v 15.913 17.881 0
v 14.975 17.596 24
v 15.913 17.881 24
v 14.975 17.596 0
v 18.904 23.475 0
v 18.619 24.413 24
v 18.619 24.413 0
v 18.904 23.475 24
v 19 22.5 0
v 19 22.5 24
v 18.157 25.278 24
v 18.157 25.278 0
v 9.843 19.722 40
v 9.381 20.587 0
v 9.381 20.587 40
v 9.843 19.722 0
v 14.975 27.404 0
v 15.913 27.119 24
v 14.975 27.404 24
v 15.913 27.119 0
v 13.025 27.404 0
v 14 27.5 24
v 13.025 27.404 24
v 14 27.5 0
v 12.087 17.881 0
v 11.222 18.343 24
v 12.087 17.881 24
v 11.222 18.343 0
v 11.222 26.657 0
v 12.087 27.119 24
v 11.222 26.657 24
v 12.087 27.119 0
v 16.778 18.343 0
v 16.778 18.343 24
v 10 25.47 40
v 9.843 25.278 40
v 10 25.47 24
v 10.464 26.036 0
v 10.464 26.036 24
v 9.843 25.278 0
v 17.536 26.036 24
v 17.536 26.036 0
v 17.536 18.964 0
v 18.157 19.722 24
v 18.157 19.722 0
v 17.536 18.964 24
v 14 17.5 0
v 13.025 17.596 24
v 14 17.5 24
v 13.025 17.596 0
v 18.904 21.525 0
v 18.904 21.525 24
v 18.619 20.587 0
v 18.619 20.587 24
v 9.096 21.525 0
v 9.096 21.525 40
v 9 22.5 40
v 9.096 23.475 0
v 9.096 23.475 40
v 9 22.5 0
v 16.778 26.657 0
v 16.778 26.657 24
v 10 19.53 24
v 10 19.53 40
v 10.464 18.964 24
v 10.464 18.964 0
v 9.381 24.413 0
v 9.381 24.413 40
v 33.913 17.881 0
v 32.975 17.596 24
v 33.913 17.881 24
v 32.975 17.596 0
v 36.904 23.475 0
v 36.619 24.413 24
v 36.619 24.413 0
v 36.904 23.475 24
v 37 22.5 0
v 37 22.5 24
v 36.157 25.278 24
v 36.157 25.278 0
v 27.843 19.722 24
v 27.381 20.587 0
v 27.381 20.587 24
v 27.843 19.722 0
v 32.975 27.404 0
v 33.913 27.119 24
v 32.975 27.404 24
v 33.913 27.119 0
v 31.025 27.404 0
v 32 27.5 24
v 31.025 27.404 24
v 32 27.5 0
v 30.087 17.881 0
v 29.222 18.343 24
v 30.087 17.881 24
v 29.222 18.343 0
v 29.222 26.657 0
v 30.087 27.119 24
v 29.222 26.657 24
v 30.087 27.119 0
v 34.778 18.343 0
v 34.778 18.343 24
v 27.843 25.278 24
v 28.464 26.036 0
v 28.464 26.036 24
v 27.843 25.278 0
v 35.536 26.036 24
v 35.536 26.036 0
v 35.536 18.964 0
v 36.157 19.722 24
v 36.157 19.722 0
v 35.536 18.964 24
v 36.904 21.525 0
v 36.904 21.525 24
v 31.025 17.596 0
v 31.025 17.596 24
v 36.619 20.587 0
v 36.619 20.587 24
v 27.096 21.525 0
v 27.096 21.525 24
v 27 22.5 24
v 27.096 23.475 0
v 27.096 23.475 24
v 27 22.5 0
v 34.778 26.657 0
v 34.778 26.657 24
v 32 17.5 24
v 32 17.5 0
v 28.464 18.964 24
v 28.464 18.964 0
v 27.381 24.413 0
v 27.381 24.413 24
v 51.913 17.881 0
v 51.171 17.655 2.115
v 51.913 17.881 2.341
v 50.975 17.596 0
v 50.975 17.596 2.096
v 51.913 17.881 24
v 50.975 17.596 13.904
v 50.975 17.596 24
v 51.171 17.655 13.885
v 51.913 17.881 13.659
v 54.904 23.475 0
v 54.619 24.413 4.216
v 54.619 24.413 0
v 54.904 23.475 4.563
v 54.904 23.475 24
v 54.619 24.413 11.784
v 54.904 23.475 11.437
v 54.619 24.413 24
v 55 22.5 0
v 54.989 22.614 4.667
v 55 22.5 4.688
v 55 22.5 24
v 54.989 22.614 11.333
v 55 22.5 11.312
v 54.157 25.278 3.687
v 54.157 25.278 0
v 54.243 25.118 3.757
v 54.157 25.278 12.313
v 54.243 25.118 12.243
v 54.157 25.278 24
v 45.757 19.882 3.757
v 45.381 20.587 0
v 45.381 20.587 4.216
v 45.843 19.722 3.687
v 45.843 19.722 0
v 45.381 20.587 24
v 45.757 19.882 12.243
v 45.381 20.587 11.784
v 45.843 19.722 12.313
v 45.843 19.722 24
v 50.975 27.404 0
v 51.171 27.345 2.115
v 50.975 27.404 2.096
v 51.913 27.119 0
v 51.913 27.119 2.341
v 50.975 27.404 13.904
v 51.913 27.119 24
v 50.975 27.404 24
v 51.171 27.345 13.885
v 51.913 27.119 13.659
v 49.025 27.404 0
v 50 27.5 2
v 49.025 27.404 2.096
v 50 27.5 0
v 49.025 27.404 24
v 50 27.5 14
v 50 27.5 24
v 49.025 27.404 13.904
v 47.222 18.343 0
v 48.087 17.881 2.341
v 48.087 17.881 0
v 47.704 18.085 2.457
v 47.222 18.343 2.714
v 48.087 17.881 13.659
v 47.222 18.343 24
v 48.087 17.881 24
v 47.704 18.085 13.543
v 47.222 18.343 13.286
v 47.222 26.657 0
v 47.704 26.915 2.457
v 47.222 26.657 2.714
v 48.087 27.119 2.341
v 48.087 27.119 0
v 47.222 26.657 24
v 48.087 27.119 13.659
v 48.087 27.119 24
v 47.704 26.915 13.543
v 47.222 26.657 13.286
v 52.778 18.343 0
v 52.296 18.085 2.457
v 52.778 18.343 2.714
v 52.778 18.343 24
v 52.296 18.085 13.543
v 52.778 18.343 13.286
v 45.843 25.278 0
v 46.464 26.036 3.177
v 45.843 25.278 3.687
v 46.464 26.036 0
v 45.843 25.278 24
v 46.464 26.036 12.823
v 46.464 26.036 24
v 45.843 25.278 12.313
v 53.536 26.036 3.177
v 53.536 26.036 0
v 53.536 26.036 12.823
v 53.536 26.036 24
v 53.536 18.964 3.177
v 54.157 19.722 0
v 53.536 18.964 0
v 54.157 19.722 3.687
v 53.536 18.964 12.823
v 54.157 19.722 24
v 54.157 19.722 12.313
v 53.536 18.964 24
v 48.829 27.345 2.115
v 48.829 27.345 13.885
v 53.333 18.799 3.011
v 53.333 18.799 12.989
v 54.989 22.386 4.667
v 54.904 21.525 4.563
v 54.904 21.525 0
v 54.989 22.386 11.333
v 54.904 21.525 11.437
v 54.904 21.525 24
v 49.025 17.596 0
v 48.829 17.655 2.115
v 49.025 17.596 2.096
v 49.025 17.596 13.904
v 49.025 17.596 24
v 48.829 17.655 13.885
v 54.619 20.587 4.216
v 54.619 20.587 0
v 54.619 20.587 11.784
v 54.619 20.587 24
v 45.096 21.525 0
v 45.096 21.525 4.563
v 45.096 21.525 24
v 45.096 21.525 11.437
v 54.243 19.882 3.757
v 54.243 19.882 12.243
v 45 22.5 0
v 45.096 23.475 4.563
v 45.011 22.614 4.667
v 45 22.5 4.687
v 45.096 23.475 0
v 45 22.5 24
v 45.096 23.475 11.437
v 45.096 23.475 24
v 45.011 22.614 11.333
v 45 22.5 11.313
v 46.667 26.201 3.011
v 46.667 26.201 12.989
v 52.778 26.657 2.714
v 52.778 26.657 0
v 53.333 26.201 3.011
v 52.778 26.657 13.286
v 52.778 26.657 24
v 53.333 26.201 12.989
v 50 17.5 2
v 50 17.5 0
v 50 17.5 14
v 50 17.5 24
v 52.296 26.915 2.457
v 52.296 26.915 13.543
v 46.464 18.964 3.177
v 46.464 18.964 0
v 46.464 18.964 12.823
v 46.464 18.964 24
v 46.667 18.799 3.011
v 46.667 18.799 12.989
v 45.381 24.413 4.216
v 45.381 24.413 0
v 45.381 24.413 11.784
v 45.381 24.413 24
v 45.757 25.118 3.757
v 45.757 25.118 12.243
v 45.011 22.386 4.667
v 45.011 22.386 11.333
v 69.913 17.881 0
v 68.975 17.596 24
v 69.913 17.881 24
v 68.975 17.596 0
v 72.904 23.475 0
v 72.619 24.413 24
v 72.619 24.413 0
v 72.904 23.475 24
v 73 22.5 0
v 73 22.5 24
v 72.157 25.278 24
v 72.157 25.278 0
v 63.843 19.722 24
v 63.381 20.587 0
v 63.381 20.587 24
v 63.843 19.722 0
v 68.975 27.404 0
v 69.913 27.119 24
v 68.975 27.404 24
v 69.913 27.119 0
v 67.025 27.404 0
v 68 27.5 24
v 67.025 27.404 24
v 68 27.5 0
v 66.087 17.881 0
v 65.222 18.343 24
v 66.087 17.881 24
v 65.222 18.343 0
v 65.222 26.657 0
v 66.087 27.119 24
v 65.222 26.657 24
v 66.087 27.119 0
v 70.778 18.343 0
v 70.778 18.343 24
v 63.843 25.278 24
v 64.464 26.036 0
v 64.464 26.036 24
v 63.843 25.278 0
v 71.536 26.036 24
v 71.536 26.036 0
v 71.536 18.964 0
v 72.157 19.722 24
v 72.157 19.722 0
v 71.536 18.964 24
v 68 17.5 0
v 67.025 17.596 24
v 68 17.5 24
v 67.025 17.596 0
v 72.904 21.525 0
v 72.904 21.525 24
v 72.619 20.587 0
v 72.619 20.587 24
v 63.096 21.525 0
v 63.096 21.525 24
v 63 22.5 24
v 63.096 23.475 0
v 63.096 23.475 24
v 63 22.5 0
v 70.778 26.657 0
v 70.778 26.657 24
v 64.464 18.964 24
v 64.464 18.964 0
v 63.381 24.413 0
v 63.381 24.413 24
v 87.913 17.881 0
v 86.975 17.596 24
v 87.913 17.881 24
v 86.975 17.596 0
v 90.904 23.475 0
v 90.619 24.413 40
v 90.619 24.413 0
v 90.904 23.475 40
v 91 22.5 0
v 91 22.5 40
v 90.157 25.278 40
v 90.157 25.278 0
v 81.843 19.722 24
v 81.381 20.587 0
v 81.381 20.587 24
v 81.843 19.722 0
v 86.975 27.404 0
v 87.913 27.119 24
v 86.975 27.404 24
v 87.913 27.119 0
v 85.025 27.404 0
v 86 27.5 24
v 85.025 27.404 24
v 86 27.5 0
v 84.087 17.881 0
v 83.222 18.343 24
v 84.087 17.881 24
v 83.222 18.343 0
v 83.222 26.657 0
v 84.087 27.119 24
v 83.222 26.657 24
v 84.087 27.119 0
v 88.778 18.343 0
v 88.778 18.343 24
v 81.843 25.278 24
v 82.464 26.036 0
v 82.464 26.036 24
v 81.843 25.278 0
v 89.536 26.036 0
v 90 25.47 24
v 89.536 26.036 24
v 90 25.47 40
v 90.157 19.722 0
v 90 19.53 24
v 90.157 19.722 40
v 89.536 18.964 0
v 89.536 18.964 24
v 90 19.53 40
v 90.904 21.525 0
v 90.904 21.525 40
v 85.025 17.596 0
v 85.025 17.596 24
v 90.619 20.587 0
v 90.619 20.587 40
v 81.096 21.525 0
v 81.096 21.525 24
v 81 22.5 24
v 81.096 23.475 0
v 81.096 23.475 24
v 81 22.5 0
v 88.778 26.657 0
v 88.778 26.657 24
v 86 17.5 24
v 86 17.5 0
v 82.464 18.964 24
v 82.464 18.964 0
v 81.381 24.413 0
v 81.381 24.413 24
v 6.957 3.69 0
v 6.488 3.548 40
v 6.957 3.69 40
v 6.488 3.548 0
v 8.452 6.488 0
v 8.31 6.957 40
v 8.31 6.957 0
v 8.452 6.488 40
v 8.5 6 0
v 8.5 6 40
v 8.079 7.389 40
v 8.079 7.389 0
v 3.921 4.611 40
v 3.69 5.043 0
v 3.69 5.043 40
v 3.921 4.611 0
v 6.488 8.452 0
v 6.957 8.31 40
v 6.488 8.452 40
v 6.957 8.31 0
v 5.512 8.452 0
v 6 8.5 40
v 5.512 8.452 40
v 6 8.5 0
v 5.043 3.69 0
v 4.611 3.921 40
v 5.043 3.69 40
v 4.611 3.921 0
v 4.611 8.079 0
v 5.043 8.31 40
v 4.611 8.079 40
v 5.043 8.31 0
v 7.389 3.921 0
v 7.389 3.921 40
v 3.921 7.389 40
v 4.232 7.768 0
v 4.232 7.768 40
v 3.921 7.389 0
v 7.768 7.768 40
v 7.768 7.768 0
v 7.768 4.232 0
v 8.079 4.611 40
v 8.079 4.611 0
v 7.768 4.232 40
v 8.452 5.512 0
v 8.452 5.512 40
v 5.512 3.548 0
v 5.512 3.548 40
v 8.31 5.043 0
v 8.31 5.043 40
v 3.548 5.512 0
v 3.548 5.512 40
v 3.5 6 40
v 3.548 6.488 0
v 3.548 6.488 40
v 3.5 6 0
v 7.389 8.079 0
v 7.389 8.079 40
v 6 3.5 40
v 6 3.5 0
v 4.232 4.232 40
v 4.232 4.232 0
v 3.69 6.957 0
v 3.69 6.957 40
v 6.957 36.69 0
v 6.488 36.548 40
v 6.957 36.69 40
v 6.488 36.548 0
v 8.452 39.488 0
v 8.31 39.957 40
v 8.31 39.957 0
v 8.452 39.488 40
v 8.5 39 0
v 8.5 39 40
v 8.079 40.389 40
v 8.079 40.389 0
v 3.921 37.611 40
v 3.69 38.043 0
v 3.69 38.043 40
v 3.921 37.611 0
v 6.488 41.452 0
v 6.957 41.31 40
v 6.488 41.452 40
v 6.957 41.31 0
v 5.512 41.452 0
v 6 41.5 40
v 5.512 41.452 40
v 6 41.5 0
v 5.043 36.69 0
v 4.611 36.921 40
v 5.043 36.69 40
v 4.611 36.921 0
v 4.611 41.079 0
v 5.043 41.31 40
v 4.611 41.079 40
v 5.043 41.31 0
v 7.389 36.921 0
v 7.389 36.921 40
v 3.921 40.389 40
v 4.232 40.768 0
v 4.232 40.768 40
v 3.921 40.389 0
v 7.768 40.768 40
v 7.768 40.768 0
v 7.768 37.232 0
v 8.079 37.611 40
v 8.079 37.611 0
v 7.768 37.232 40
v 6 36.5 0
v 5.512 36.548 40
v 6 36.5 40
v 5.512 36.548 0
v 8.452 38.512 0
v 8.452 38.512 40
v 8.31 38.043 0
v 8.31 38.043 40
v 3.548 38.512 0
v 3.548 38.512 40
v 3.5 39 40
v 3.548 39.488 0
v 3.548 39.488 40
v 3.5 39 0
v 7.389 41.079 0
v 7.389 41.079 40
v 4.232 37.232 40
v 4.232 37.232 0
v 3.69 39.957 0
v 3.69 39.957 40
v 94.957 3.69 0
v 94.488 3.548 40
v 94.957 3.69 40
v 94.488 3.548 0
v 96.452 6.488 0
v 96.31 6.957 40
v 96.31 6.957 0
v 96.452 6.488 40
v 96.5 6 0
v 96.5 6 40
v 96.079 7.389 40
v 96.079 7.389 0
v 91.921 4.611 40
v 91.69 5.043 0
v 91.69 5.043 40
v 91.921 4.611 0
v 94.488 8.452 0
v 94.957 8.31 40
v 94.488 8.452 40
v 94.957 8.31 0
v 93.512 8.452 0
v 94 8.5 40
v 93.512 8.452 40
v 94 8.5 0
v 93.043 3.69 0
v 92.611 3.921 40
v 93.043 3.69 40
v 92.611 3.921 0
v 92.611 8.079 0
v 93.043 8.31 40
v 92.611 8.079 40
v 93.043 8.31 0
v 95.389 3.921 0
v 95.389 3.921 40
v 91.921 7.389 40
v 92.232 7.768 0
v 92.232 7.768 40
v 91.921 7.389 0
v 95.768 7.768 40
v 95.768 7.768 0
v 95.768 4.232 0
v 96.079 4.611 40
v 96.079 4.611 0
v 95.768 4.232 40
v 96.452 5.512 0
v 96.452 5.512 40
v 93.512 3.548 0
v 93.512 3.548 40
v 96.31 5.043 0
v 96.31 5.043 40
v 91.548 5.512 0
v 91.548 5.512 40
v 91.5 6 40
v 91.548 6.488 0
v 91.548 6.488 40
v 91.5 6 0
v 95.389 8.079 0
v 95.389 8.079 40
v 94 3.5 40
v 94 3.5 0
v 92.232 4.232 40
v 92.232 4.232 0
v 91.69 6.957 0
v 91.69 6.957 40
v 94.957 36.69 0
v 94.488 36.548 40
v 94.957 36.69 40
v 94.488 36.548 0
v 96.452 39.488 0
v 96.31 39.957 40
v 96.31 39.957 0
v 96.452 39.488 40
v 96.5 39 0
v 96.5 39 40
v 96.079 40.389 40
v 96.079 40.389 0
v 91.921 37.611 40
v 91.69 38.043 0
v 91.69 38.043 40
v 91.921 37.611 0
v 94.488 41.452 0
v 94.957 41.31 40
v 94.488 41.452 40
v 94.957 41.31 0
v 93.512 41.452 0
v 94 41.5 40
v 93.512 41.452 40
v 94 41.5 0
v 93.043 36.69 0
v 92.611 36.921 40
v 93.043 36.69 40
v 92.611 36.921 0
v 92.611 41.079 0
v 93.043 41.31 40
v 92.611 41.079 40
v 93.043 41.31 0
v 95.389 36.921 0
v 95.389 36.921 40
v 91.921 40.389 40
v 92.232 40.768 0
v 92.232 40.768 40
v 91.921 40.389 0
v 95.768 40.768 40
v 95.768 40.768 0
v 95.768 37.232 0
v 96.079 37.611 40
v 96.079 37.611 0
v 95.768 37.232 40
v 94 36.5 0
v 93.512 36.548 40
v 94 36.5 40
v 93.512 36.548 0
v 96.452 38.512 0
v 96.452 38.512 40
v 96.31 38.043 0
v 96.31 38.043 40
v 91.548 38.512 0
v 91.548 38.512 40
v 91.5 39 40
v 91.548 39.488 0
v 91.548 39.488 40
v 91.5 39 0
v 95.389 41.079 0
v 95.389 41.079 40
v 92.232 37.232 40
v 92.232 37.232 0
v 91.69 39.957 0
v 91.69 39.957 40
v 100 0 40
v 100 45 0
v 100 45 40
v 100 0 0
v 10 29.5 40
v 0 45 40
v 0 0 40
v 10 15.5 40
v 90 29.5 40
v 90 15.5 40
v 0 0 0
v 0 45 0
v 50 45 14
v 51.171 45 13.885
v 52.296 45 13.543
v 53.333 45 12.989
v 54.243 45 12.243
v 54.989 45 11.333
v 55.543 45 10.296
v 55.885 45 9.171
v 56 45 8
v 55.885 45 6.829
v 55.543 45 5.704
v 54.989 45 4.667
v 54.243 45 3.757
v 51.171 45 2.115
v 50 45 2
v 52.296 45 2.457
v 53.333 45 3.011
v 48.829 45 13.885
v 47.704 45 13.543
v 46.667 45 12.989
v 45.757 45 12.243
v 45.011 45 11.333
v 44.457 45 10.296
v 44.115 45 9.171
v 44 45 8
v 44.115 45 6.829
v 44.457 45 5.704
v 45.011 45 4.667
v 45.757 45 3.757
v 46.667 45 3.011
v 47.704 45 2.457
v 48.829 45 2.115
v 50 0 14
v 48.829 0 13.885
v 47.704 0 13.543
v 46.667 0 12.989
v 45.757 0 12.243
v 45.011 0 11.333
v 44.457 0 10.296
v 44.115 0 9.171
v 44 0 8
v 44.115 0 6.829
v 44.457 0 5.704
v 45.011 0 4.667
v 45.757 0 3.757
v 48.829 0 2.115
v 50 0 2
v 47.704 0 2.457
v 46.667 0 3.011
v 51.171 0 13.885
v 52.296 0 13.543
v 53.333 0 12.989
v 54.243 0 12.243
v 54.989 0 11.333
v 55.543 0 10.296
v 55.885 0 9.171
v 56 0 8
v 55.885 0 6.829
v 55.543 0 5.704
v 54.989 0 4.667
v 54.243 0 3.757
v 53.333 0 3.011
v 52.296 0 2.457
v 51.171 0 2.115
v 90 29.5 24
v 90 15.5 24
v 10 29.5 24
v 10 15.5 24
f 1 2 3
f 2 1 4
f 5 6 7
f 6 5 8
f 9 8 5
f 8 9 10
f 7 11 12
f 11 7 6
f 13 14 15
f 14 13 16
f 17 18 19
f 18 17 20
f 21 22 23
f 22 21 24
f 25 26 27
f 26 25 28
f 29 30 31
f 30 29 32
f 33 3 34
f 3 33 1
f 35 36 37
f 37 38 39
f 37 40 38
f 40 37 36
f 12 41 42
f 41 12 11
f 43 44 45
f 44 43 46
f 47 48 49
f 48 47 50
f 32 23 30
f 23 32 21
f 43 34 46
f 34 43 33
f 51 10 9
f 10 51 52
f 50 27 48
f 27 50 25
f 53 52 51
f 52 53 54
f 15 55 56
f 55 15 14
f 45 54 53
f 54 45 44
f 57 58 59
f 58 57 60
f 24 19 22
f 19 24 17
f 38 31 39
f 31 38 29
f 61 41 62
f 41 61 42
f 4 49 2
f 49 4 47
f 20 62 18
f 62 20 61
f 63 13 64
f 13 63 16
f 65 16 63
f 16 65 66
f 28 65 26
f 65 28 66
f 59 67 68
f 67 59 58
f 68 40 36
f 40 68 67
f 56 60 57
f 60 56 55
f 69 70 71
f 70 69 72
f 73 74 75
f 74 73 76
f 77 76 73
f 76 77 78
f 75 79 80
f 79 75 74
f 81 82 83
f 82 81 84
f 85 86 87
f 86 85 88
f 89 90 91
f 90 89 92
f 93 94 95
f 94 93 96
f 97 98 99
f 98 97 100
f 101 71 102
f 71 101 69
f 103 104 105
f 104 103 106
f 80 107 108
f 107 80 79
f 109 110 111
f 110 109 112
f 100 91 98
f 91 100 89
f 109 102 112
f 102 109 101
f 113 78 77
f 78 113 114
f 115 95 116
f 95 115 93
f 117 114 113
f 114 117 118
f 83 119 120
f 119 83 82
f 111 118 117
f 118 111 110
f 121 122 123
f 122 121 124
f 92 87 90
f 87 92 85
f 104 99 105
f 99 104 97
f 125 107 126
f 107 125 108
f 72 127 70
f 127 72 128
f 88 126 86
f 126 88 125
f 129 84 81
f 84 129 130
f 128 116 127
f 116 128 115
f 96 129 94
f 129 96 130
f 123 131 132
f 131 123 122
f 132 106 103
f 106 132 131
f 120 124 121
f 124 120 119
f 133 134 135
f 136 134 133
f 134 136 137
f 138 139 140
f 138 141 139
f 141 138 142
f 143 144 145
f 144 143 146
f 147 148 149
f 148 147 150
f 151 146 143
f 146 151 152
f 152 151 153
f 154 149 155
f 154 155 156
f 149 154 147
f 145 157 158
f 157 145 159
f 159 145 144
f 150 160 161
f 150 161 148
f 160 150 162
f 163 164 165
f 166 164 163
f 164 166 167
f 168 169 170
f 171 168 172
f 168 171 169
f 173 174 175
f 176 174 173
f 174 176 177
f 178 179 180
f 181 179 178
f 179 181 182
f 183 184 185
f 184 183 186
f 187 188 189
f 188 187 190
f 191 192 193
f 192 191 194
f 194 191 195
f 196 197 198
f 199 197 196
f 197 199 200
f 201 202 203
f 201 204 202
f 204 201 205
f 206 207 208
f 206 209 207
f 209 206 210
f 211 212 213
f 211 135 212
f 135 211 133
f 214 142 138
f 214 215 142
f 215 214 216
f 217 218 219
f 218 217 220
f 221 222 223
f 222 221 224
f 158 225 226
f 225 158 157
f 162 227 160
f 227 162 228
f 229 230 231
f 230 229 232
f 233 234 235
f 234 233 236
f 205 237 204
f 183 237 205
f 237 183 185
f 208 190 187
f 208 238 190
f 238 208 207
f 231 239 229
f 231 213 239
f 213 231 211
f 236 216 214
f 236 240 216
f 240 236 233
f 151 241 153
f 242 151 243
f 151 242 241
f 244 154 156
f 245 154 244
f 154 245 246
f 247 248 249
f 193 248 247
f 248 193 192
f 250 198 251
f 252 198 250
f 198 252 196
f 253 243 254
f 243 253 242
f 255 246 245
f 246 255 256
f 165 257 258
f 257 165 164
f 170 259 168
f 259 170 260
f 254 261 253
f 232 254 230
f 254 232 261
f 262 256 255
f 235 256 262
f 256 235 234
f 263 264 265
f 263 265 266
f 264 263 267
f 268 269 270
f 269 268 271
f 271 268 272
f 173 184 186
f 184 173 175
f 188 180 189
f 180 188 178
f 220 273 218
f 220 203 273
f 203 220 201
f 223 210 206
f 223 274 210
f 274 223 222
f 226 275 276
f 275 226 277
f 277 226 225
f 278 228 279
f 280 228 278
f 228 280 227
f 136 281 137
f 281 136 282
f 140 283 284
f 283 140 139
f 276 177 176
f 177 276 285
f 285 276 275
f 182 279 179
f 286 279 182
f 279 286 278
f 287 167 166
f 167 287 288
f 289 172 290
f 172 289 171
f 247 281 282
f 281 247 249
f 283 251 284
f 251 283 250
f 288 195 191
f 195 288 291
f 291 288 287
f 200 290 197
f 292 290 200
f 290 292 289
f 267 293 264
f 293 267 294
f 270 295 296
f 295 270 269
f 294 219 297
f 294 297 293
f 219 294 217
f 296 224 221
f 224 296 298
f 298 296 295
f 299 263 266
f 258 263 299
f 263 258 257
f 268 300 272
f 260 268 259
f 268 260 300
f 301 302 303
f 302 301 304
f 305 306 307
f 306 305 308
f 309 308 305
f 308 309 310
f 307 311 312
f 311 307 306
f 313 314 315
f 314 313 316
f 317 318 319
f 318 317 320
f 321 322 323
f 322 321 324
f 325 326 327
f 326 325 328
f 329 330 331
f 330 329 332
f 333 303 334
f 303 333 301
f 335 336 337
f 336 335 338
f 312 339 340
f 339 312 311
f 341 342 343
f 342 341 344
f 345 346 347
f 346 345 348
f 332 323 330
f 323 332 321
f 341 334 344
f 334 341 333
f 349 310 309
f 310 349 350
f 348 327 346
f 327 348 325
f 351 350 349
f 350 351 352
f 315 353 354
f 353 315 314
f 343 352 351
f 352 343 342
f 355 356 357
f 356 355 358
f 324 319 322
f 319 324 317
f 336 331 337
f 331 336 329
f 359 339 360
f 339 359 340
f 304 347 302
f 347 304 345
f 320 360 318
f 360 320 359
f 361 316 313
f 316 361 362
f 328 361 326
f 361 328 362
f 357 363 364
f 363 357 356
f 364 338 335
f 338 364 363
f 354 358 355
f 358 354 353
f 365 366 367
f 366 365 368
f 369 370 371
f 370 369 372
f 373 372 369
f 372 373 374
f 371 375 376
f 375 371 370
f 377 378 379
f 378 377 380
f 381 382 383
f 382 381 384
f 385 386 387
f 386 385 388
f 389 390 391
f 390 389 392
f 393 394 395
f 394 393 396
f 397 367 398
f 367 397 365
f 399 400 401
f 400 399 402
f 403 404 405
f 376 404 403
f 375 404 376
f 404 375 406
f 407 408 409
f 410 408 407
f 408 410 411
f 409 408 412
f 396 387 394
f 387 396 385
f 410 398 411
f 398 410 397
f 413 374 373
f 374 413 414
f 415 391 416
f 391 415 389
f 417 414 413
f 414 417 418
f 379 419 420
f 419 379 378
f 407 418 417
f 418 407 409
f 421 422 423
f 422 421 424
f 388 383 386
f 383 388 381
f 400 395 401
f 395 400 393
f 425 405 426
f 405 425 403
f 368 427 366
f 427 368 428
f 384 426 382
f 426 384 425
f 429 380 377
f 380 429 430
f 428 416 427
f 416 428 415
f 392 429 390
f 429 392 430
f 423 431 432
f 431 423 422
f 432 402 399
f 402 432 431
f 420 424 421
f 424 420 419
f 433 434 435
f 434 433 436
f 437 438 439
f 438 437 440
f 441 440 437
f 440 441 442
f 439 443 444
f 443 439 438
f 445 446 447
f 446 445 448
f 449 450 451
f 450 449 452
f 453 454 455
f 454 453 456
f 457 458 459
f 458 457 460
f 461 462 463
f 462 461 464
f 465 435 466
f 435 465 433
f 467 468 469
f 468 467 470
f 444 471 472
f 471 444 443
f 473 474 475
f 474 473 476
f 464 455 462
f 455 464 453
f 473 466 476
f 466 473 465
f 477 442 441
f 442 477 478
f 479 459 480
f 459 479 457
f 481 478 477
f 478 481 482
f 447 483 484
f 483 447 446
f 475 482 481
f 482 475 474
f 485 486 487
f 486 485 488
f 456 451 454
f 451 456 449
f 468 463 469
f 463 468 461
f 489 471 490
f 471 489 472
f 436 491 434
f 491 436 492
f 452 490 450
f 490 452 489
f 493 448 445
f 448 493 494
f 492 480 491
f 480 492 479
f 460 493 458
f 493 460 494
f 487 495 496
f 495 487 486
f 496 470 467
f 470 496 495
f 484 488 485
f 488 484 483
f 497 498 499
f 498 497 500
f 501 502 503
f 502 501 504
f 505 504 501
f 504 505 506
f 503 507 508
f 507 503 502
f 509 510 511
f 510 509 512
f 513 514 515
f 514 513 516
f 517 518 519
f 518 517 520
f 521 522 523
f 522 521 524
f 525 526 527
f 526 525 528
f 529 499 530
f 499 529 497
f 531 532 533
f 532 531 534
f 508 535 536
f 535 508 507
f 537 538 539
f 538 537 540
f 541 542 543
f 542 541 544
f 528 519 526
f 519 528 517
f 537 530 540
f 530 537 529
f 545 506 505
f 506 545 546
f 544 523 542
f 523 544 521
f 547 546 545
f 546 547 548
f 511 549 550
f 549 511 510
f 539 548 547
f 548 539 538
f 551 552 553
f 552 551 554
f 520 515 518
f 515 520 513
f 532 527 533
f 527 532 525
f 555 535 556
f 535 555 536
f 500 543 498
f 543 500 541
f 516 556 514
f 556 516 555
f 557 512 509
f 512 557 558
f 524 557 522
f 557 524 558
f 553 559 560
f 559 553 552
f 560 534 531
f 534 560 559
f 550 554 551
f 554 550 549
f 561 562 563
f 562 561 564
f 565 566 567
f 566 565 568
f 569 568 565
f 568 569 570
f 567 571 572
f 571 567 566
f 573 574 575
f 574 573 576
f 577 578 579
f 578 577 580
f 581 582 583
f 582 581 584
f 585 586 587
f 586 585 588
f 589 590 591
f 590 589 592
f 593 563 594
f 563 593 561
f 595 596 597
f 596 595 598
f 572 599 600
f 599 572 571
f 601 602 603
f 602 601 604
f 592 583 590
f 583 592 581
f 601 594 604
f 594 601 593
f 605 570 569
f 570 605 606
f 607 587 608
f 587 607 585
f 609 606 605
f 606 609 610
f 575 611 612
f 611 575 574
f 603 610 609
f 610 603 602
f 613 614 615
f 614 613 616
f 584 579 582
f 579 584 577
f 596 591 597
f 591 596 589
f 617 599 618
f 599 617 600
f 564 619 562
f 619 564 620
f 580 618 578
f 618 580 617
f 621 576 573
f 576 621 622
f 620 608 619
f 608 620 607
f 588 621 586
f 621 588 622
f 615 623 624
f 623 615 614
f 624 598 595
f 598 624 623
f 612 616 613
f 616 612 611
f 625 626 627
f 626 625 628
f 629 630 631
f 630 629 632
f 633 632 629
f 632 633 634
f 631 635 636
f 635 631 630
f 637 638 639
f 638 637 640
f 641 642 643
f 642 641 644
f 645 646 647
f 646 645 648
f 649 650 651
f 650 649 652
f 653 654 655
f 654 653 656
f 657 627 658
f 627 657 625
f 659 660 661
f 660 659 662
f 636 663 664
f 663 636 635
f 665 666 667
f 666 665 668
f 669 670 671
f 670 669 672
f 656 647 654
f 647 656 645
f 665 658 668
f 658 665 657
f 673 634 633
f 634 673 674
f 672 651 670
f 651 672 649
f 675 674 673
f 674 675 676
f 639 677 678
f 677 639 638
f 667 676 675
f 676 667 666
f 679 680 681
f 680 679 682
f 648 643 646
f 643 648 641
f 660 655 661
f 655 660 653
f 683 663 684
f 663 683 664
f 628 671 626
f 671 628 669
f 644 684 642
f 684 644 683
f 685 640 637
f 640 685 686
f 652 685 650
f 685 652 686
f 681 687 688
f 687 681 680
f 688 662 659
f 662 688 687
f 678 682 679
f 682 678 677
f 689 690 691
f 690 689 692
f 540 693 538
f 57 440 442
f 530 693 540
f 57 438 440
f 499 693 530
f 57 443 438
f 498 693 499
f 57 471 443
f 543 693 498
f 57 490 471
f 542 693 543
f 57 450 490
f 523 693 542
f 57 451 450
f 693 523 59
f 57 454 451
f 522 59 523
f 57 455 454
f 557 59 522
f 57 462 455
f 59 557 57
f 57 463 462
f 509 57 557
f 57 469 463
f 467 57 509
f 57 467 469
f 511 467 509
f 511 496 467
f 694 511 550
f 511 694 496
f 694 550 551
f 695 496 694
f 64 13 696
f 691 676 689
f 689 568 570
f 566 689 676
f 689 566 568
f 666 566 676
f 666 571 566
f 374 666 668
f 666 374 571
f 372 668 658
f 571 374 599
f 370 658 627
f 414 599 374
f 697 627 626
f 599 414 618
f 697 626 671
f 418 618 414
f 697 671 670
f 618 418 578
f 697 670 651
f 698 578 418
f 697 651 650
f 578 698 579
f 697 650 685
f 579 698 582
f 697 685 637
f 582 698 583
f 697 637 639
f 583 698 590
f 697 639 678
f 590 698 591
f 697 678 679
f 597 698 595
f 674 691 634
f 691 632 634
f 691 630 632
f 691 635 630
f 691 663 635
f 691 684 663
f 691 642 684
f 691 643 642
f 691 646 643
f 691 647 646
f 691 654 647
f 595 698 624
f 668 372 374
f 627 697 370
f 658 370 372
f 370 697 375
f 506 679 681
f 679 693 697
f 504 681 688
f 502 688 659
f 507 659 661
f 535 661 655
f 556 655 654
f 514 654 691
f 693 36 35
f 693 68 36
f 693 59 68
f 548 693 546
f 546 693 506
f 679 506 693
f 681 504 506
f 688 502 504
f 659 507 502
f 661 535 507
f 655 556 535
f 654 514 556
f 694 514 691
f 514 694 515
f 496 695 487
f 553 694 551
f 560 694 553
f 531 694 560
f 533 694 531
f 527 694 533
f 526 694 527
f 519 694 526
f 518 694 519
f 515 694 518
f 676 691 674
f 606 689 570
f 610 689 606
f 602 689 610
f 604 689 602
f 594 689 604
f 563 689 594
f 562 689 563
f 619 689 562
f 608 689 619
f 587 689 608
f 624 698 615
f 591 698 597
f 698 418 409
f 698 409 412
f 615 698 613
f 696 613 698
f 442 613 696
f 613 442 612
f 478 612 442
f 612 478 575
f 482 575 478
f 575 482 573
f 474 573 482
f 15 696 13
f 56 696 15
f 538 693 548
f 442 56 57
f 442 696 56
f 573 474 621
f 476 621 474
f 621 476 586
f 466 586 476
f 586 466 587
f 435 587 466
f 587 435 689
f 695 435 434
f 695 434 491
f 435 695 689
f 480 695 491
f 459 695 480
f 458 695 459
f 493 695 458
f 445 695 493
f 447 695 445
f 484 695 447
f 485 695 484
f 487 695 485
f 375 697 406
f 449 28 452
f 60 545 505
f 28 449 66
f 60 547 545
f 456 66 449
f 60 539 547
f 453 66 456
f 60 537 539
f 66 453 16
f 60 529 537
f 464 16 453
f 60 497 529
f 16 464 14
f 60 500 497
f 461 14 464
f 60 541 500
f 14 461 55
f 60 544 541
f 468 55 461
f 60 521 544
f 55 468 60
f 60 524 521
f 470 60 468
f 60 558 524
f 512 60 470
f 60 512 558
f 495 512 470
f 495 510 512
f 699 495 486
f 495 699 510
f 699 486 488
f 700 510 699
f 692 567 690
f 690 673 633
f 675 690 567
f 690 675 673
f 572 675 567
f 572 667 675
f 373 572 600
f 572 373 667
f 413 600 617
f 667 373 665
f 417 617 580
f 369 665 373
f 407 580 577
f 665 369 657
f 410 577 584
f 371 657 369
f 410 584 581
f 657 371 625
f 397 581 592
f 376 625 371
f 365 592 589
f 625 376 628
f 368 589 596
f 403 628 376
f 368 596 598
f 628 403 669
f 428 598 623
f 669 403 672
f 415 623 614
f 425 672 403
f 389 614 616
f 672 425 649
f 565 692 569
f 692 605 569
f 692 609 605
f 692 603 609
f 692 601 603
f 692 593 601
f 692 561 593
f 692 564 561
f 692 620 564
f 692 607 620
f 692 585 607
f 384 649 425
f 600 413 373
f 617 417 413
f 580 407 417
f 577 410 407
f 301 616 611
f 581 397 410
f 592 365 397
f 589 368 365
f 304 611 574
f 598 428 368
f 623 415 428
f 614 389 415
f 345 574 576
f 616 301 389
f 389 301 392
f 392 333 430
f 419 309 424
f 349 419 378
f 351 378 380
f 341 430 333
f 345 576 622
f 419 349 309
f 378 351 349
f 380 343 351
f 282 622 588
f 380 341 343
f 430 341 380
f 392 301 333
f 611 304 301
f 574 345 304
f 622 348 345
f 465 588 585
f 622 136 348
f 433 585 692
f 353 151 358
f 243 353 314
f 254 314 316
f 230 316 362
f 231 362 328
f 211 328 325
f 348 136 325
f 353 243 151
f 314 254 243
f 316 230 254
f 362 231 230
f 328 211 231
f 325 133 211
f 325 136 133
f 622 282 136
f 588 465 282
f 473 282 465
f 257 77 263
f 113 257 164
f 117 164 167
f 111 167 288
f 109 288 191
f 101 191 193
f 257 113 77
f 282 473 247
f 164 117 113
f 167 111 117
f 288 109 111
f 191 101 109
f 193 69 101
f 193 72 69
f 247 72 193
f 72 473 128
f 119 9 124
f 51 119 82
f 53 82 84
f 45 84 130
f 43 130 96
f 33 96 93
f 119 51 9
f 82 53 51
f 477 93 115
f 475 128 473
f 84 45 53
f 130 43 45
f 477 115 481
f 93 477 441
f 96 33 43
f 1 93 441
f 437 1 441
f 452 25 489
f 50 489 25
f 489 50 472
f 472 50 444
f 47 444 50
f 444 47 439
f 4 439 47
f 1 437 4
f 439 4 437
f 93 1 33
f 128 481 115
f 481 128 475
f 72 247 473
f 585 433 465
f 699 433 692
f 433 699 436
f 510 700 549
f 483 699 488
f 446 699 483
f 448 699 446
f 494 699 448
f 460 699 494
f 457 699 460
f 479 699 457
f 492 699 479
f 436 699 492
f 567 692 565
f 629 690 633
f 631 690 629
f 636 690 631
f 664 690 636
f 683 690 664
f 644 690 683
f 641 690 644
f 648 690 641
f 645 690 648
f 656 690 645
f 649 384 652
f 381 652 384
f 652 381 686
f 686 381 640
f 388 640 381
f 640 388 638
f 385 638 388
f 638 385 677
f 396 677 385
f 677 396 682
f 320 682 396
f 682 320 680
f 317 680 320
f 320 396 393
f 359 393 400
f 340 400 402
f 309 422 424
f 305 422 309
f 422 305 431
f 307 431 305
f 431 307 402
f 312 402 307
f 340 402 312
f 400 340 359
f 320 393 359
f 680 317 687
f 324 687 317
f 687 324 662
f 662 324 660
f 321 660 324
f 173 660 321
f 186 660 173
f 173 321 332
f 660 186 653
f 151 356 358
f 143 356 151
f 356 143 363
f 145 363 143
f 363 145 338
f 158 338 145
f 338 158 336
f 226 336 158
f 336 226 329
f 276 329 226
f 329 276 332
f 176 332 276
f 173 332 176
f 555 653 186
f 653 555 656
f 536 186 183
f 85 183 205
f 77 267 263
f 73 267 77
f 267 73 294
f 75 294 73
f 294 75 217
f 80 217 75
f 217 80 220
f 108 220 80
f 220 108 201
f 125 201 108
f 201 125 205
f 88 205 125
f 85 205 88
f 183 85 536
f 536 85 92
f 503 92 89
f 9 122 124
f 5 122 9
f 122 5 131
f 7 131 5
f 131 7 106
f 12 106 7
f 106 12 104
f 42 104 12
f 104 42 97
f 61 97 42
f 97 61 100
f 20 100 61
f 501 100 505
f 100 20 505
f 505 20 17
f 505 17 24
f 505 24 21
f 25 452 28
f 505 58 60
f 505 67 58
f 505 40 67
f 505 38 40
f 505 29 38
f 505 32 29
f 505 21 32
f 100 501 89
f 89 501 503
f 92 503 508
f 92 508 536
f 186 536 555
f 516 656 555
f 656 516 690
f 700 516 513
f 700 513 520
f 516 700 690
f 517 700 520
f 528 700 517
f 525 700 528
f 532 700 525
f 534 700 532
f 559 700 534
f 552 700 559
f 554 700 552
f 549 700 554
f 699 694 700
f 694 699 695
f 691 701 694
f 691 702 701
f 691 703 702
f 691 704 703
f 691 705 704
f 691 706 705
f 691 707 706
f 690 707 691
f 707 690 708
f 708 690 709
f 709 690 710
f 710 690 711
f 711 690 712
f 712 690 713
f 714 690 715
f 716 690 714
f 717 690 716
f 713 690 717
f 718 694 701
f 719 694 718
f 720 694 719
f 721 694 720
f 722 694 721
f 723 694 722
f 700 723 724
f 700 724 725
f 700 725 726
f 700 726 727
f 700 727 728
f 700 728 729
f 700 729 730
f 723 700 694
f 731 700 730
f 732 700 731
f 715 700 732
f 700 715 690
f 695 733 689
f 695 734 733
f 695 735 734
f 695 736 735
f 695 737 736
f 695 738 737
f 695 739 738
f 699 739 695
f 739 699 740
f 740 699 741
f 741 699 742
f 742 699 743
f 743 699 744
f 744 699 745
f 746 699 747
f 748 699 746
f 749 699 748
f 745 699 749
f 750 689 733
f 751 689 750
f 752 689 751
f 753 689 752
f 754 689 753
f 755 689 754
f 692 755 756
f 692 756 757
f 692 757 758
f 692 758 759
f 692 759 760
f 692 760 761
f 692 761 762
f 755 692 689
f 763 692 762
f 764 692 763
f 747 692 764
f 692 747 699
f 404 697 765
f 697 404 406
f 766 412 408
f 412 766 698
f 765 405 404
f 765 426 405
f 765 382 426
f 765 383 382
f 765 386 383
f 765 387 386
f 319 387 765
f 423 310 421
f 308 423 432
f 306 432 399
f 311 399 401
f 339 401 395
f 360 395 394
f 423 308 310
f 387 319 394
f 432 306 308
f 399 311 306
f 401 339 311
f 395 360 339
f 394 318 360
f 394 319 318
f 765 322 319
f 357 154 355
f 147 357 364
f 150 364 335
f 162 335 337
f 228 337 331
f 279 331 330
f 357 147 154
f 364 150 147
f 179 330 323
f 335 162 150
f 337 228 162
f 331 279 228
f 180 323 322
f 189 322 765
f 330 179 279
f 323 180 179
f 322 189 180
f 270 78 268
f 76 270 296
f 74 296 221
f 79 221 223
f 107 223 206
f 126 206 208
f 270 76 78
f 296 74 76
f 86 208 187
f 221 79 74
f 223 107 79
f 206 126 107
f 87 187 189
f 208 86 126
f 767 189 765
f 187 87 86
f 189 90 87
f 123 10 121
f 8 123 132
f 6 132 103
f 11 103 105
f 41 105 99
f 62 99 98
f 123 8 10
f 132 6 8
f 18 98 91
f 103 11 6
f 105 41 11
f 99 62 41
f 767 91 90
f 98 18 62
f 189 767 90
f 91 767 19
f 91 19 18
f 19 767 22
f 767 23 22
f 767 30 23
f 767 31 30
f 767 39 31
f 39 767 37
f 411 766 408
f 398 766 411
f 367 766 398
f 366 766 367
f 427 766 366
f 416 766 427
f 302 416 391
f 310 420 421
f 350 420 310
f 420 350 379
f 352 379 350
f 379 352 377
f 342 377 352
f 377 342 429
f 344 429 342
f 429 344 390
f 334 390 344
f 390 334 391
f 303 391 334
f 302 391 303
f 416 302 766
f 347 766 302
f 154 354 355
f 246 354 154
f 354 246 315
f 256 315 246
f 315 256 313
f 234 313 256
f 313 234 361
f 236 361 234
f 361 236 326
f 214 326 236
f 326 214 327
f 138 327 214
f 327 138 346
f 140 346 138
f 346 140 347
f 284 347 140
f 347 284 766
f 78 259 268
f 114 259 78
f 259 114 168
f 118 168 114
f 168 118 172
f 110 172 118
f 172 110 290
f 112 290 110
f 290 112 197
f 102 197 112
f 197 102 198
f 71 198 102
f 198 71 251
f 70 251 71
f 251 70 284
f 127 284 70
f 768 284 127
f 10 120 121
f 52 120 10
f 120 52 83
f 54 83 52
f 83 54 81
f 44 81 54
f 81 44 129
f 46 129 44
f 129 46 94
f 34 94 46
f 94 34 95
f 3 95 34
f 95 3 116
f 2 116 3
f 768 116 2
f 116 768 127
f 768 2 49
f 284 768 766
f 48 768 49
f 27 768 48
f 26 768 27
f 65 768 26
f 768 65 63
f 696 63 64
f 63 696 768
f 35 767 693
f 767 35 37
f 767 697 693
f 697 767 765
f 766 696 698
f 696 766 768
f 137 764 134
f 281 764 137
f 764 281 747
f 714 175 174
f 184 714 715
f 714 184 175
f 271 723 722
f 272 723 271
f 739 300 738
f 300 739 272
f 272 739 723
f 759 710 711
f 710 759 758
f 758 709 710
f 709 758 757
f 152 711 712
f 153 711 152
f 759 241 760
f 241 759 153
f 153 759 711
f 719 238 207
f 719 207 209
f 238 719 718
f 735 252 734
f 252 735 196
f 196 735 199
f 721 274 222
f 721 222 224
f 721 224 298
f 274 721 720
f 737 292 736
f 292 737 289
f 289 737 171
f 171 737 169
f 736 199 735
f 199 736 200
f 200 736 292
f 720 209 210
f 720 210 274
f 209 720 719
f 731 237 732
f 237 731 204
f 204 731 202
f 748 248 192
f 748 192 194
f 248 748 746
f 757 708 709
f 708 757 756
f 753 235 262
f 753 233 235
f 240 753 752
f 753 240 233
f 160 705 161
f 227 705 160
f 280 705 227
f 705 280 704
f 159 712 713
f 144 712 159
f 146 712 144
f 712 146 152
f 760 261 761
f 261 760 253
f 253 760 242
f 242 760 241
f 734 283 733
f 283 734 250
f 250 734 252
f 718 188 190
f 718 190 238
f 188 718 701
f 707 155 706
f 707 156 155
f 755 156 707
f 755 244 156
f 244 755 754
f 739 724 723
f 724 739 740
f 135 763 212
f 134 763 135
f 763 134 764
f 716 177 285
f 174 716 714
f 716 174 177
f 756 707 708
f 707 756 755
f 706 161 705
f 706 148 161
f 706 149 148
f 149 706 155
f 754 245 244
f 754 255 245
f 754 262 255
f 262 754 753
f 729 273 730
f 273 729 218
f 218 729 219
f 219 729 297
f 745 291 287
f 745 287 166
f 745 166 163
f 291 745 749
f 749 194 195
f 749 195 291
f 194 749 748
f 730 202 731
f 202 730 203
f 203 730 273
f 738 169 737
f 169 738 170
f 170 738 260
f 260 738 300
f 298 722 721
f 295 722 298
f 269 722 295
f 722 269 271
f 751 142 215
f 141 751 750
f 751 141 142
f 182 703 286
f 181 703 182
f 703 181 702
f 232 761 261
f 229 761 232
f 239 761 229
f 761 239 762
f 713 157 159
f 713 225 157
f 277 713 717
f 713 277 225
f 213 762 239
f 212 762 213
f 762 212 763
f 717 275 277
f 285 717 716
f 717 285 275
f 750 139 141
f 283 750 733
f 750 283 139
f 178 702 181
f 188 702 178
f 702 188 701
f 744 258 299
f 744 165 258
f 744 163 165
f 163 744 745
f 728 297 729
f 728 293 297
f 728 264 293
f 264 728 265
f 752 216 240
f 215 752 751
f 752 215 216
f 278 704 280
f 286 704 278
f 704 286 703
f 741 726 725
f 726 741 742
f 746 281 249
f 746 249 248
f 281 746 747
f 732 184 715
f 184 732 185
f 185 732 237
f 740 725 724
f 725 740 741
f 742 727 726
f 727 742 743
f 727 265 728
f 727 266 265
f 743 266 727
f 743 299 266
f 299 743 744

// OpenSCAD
$fn = 32;

// ----------------------------------------------------------------------
// Manifold block: side_outlet manifold
// ----------------------------------------------------------------------

// --- parameters (mm) ---
block_l = 100;            // block length, X
block_w = 45;             // block width, Y
block_h = 40;             // block height, Z
port_d = 10;              // port bore diameter
port_pitch = 18;          // port pitch along X
gallery_d = 14;           // top gallery width, Y
gallery_depth = 16;       // gallery pocket depth
wall_p = 10;              // gallery end wall thickness, X
mnt_d = 5;                // mounting hole diameter
mnt_in = 6;               // mounting hole inset from the edges
out_d = 12;               // outlet bore diameter
out_z = 8;                // outlet axis height

n_ports = 5;  // ports in the row
port_x0 = (block_l - (n_ports - 1) * port_pitch) / 2;  // first port X

difference() {
  cube([block_l, block_w, block_h]);
  for (i = [0 : n_ports - 1])
    translate([port_x0 + i * port_pitch, block_w / 2, -1])
      cylinder(h = block_h + 2, d = port_d);
  translate([wall_p, block_w / 2 - gallery_d / 2, block_h - gallery_depth])
    cube([block_l - 2 * wall_p, gallery_d, gallery_depth + 1]);
  for (cx = [mnt_in, block_l - mnt_in])
    for (cy = [mnt_in, block_w - mnt_in])
      translate([cx, cy, -1]) cylinder(h = block_h + 2, d = mnt_d);
  translate([block_l / 2, -1, out_z]) rotate([-90, 0, 0])
    cylinder(h = block_w + 2, d = out_d);
}
